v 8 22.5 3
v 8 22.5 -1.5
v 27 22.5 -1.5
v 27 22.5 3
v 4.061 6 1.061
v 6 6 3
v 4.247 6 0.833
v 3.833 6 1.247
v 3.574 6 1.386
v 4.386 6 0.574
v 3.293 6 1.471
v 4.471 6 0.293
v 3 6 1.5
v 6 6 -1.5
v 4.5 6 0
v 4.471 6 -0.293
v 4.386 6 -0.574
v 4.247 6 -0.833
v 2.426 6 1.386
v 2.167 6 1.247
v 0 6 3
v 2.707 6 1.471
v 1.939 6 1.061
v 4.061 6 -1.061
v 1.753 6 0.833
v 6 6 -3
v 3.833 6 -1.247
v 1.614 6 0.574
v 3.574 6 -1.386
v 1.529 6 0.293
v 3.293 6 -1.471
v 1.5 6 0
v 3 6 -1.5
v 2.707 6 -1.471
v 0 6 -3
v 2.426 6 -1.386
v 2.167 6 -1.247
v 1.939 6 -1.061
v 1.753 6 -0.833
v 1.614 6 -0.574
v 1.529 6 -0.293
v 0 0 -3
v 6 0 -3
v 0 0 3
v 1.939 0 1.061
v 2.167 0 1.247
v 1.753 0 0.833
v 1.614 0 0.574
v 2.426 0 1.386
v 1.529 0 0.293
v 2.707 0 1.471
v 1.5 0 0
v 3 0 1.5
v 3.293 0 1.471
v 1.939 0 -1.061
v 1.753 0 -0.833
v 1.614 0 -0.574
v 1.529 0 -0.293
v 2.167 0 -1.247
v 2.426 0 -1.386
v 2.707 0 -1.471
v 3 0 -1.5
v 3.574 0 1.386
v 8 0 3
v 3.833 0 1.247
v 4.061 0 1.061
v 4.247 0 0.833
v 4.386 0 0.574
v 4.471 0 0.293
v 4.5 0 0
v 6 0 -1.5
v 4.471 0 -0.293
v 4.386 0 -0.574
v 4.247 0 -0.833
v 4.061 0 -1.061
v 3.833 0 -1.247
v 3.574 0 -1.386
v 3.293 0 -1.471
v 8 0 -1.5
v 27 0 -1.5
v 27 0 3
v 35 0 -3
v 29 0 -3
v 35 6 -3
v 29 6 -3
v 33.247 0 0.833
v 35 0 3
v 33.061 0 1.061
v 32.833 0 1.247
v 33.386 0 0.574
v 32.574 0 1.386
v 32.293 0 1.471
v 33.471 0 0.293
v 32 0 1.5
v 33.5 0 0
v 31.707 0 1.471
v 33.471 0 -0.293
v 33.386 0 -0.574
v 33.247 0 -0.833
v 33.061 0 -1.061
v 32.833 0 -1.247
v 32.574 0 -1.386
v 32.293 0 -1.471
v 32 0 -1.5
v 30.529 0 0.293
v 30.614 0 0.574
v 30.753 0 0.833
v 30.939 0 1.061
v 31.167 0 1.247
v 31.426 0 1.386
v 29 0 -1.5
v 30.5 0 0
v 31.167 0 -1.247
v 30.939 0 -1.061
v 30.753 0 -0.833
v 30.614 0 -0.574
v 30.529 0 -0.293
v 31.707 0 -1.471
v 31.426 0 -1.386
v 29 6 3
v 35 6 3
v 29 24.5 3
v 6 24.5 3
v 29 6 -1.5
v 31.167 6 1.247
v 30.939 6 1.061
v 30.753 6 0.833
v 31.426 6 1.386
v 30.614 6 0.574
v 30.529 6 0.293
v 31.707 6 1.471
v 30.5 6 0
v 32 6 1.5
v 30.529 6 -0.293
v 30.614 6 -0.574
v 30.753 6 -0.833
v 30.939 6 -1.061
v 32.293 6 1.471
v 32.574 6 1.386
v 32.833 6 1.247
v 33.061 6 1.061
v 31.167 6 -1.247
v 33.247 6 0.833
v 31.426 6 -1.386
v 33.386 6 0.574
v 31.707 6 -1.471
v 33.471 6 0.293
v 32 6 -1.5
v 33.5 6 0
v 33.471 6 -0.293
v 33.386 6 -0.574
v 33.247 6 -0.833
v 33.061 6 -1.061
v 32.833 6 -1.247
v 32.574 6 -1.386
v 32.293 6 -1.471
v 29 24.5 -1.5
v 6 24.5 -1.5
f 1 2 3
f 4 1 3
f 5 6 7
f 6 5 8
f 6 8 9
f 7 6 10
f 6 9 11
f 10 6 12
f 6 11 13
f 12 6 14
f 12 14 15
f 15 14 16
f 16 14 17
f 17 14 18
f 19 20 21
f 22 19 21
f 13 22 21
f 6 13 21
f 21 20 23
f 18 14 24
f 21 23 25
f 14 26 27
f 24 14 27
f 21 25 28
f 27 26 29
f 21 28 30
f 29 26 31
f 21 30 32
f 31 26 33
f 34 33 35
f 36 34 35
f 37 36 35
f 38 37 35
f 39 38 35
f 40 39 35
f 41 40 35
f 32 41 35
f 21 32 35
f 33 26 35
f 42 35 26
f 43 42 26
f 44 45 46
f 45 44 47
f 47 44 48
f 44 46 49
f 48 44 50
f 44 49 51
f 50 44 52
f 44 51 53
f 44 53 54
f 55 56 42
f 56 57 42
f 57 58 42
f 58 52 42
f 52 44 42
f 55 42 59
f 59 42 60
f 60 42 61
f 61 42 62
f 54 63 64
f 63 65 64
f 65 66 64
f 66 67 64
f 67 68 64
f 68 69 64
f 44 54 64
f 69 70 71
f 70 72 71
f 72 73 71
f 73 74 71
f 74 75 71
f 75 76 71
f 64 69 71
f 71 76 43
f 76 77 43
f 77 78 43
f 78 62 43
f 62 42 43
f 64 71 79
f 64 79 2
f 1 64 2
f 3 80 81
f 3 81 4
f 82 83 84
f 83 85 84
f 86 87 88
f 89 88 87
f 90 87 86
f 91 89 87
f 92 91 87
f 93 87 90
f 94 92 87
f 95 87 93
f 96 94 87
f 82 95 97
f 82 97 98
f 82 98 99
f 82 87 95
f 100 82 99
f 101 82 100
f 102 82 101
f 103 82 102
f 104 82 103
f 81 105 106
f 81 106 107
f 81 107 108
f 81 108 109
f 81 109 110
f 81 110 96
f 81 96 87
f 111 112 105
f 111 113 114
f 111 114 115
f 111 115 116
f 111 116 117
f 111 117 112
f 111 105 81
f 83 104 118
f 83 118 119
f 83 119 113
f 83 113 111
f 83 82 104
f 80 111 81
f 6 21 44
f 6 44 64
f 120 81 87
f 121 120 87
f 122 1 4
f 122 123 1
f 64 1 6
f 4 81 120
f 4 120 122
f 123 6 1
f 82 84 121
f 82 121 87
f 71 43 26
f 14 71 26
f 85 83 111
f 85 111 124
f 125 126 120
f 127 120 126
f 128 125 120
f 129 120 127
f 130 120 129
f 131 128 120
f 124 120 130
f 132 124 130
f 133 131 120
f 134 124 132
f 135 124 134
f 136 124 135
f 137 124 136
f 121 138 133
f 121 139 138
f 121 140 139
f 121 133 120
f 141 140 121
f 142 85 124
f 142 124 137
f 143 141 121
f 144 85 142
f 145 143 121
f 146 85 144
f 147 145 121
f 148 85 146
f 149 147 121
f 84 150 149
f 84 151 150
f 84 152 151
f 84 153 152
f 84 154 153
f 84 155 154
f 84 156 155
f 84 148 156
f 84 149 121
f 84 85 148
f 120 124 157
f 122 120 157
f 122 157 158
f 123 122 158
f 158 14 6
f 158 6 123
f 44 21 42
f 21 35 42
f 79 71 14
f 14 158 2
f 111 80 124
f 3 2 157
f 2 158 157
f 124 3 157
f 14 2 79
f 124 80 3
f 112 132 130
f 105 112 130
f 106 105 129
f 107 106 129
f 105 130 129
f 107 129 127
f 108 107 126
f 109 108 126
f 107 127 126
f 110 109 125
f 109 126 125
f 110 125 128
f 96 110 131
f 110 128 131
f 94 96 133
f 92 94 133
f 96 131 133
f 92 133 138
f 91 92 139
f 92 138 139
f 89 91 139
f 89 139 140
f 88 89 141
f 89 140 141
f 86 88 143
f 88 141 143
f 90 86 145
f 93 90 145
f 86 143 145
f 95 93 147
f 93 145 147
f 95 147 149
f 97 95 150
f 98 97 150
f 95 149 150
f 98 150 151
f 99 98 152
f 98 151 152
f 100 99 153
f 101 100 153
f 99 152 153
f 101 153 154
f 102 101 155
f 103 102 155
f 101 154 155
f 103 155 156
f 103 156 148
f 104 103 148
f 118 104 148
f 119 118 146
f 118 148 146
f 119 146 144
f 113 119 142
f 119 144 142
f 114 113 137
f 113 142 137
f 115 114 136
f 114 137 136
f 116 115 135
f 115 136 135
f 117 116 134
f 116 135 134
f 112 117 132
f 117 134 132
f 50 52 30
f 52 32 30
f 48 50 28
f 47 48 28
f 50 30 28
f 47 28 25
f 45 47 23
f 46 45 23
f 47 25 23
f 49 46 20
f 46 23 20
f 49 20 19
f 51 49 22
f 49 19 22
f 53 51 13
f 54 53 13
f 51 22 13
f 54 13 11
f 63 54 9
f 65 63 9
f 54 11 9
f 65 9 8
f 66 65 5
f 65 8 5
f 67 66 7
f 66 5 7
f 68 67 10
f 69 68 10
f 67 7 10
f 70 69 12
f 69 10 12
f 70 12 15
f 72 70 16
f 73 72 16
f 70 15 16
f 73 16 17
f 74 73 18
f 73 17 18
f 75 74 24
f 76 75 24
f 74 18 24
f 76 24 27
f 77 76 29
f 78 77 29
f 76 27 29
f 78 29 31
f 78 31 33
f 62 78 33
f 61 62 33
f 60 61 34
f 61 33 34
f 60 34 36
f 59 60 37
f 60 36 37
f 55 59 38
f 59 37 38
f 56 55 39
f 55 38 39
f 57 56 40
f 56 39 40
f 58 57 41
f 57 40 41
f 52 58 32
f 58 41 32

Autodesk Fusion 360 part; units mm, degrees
sketch "Sketch1" plane through (0, 0, 0) normal (0, 0, 1) x (1, 0, 0)
  line L0 (0, 0) -> (6, 0)
  line L1 (6, 0) -> (6, 6)
  line L2 (6, 6) -> (0, 6)
  line L3 (0, 6) -> (0, 0)
  line L4 (6, 0) -> (8, 0)
  line L5 (8, 0) -> (8, 24.5)
  line L6 (8, 24.5) -> (6, 24.5)
  line L7 (6, 24.5) -> (6, 0)
  line L8 (6, 24.5) -> (17.5, 24.5)
  line L9 (17.5, 24.5) -> (17.5, 22.5)
  line L10 (17.5, 22.5) -> (6, 22.5)
  line L11 (6, 22.5) -> (6, 24.5)
  line L12 (29, 6) -> (35, 6)
  line L13 (17.5, 22.5) -> (29, 22.5)
  line L14 (29, 0) -> (29, 6)
  line L15 (35, 6) -> (35, 0)
  line L16 (29, 24.5) -> (29, 0)
  line L17 (27, 24.5) -> (29, 24.5)
  line L18 (17.5, 24.5) -> (17.5, 22.5)
  line L19 (29, 22.5) -> (29, 24.5)
  line L20 (35, 0) -> (29, 0)
  line L21 (29, 24.5) -> (17.5, 24.5)
  line L22 (27, 0) -> (27, 24.5)
  line L23 (29, 0) -> (27, 0)
  point P0 (35, 0)
  dimension "d1" = 6
  dimension "d2" = 6
  dimension "d3" = 2
  dimension "d4" = 24.5
  dimension "d5" = 11.5
  dimension "d6" = 2
extrude "Extrude1" add sketch "Sketch1" along normal blind 3 and the other way blind 3 contours L0 L1 L2 L3 L7 | L12 L14 L15 L16 L20 makes body 1 at (31, 6, -1) makes body 2 at (0, 2, 1)
extrude "Extrude2" add sketch "Sketch1" along normal blind 1.5 and the other way blind 1.5 contours L1 L4 L5 L7 L10 | L5 L6 L7 L8 L10 L11 | L5 L8 L9 L10 L18 | L9 L13 L18 L21 L22 | L13 L16 L17 L19 L21 L22 | L13 L14 L16 L22 L23 bodies 1 2
sketch "Sketch3" plane through (0, 6, 0) normal (0, 1, 0) x (-1, 0, 0)
  line L0 (0, -3) -> (0, 3)
  line L1 (0, 3) -> (-6, 3)
  line L2 (-6, 3) -> (-6, 1.5)
  line L3 (-6, 1.5) -> (-6, -1.5)
  line L4 (-6, -1.5) -> (-6, -3)
  line L5 (-6, -3) -> (0, -3)
  circle A0 centre (-3, 0) radius 1.5
  circle A1 centre (-32, 0) radius 1.5
  line L6 (-35, -3) -> (-35, 3)
  line L7 (-29, -3) -> (-35, -3)
  dimension "d16" = 3
  dimension "d17" = 3
  dimension "d18" = 3
  dimension "d19" = 3
  dimension "d20" = 3
  dimension "d21" = 3
extrude "Extrude3" cut sketch "Sketch3" against normal blind 11 contours A0 | A1 bodies 1
extrude "Extrude4" add 1 faces at (27.6667, 9.5, 1.5) along direction (0, 0, 1) up to surface (1.5 mm away) on bodies 1 bodies 1
